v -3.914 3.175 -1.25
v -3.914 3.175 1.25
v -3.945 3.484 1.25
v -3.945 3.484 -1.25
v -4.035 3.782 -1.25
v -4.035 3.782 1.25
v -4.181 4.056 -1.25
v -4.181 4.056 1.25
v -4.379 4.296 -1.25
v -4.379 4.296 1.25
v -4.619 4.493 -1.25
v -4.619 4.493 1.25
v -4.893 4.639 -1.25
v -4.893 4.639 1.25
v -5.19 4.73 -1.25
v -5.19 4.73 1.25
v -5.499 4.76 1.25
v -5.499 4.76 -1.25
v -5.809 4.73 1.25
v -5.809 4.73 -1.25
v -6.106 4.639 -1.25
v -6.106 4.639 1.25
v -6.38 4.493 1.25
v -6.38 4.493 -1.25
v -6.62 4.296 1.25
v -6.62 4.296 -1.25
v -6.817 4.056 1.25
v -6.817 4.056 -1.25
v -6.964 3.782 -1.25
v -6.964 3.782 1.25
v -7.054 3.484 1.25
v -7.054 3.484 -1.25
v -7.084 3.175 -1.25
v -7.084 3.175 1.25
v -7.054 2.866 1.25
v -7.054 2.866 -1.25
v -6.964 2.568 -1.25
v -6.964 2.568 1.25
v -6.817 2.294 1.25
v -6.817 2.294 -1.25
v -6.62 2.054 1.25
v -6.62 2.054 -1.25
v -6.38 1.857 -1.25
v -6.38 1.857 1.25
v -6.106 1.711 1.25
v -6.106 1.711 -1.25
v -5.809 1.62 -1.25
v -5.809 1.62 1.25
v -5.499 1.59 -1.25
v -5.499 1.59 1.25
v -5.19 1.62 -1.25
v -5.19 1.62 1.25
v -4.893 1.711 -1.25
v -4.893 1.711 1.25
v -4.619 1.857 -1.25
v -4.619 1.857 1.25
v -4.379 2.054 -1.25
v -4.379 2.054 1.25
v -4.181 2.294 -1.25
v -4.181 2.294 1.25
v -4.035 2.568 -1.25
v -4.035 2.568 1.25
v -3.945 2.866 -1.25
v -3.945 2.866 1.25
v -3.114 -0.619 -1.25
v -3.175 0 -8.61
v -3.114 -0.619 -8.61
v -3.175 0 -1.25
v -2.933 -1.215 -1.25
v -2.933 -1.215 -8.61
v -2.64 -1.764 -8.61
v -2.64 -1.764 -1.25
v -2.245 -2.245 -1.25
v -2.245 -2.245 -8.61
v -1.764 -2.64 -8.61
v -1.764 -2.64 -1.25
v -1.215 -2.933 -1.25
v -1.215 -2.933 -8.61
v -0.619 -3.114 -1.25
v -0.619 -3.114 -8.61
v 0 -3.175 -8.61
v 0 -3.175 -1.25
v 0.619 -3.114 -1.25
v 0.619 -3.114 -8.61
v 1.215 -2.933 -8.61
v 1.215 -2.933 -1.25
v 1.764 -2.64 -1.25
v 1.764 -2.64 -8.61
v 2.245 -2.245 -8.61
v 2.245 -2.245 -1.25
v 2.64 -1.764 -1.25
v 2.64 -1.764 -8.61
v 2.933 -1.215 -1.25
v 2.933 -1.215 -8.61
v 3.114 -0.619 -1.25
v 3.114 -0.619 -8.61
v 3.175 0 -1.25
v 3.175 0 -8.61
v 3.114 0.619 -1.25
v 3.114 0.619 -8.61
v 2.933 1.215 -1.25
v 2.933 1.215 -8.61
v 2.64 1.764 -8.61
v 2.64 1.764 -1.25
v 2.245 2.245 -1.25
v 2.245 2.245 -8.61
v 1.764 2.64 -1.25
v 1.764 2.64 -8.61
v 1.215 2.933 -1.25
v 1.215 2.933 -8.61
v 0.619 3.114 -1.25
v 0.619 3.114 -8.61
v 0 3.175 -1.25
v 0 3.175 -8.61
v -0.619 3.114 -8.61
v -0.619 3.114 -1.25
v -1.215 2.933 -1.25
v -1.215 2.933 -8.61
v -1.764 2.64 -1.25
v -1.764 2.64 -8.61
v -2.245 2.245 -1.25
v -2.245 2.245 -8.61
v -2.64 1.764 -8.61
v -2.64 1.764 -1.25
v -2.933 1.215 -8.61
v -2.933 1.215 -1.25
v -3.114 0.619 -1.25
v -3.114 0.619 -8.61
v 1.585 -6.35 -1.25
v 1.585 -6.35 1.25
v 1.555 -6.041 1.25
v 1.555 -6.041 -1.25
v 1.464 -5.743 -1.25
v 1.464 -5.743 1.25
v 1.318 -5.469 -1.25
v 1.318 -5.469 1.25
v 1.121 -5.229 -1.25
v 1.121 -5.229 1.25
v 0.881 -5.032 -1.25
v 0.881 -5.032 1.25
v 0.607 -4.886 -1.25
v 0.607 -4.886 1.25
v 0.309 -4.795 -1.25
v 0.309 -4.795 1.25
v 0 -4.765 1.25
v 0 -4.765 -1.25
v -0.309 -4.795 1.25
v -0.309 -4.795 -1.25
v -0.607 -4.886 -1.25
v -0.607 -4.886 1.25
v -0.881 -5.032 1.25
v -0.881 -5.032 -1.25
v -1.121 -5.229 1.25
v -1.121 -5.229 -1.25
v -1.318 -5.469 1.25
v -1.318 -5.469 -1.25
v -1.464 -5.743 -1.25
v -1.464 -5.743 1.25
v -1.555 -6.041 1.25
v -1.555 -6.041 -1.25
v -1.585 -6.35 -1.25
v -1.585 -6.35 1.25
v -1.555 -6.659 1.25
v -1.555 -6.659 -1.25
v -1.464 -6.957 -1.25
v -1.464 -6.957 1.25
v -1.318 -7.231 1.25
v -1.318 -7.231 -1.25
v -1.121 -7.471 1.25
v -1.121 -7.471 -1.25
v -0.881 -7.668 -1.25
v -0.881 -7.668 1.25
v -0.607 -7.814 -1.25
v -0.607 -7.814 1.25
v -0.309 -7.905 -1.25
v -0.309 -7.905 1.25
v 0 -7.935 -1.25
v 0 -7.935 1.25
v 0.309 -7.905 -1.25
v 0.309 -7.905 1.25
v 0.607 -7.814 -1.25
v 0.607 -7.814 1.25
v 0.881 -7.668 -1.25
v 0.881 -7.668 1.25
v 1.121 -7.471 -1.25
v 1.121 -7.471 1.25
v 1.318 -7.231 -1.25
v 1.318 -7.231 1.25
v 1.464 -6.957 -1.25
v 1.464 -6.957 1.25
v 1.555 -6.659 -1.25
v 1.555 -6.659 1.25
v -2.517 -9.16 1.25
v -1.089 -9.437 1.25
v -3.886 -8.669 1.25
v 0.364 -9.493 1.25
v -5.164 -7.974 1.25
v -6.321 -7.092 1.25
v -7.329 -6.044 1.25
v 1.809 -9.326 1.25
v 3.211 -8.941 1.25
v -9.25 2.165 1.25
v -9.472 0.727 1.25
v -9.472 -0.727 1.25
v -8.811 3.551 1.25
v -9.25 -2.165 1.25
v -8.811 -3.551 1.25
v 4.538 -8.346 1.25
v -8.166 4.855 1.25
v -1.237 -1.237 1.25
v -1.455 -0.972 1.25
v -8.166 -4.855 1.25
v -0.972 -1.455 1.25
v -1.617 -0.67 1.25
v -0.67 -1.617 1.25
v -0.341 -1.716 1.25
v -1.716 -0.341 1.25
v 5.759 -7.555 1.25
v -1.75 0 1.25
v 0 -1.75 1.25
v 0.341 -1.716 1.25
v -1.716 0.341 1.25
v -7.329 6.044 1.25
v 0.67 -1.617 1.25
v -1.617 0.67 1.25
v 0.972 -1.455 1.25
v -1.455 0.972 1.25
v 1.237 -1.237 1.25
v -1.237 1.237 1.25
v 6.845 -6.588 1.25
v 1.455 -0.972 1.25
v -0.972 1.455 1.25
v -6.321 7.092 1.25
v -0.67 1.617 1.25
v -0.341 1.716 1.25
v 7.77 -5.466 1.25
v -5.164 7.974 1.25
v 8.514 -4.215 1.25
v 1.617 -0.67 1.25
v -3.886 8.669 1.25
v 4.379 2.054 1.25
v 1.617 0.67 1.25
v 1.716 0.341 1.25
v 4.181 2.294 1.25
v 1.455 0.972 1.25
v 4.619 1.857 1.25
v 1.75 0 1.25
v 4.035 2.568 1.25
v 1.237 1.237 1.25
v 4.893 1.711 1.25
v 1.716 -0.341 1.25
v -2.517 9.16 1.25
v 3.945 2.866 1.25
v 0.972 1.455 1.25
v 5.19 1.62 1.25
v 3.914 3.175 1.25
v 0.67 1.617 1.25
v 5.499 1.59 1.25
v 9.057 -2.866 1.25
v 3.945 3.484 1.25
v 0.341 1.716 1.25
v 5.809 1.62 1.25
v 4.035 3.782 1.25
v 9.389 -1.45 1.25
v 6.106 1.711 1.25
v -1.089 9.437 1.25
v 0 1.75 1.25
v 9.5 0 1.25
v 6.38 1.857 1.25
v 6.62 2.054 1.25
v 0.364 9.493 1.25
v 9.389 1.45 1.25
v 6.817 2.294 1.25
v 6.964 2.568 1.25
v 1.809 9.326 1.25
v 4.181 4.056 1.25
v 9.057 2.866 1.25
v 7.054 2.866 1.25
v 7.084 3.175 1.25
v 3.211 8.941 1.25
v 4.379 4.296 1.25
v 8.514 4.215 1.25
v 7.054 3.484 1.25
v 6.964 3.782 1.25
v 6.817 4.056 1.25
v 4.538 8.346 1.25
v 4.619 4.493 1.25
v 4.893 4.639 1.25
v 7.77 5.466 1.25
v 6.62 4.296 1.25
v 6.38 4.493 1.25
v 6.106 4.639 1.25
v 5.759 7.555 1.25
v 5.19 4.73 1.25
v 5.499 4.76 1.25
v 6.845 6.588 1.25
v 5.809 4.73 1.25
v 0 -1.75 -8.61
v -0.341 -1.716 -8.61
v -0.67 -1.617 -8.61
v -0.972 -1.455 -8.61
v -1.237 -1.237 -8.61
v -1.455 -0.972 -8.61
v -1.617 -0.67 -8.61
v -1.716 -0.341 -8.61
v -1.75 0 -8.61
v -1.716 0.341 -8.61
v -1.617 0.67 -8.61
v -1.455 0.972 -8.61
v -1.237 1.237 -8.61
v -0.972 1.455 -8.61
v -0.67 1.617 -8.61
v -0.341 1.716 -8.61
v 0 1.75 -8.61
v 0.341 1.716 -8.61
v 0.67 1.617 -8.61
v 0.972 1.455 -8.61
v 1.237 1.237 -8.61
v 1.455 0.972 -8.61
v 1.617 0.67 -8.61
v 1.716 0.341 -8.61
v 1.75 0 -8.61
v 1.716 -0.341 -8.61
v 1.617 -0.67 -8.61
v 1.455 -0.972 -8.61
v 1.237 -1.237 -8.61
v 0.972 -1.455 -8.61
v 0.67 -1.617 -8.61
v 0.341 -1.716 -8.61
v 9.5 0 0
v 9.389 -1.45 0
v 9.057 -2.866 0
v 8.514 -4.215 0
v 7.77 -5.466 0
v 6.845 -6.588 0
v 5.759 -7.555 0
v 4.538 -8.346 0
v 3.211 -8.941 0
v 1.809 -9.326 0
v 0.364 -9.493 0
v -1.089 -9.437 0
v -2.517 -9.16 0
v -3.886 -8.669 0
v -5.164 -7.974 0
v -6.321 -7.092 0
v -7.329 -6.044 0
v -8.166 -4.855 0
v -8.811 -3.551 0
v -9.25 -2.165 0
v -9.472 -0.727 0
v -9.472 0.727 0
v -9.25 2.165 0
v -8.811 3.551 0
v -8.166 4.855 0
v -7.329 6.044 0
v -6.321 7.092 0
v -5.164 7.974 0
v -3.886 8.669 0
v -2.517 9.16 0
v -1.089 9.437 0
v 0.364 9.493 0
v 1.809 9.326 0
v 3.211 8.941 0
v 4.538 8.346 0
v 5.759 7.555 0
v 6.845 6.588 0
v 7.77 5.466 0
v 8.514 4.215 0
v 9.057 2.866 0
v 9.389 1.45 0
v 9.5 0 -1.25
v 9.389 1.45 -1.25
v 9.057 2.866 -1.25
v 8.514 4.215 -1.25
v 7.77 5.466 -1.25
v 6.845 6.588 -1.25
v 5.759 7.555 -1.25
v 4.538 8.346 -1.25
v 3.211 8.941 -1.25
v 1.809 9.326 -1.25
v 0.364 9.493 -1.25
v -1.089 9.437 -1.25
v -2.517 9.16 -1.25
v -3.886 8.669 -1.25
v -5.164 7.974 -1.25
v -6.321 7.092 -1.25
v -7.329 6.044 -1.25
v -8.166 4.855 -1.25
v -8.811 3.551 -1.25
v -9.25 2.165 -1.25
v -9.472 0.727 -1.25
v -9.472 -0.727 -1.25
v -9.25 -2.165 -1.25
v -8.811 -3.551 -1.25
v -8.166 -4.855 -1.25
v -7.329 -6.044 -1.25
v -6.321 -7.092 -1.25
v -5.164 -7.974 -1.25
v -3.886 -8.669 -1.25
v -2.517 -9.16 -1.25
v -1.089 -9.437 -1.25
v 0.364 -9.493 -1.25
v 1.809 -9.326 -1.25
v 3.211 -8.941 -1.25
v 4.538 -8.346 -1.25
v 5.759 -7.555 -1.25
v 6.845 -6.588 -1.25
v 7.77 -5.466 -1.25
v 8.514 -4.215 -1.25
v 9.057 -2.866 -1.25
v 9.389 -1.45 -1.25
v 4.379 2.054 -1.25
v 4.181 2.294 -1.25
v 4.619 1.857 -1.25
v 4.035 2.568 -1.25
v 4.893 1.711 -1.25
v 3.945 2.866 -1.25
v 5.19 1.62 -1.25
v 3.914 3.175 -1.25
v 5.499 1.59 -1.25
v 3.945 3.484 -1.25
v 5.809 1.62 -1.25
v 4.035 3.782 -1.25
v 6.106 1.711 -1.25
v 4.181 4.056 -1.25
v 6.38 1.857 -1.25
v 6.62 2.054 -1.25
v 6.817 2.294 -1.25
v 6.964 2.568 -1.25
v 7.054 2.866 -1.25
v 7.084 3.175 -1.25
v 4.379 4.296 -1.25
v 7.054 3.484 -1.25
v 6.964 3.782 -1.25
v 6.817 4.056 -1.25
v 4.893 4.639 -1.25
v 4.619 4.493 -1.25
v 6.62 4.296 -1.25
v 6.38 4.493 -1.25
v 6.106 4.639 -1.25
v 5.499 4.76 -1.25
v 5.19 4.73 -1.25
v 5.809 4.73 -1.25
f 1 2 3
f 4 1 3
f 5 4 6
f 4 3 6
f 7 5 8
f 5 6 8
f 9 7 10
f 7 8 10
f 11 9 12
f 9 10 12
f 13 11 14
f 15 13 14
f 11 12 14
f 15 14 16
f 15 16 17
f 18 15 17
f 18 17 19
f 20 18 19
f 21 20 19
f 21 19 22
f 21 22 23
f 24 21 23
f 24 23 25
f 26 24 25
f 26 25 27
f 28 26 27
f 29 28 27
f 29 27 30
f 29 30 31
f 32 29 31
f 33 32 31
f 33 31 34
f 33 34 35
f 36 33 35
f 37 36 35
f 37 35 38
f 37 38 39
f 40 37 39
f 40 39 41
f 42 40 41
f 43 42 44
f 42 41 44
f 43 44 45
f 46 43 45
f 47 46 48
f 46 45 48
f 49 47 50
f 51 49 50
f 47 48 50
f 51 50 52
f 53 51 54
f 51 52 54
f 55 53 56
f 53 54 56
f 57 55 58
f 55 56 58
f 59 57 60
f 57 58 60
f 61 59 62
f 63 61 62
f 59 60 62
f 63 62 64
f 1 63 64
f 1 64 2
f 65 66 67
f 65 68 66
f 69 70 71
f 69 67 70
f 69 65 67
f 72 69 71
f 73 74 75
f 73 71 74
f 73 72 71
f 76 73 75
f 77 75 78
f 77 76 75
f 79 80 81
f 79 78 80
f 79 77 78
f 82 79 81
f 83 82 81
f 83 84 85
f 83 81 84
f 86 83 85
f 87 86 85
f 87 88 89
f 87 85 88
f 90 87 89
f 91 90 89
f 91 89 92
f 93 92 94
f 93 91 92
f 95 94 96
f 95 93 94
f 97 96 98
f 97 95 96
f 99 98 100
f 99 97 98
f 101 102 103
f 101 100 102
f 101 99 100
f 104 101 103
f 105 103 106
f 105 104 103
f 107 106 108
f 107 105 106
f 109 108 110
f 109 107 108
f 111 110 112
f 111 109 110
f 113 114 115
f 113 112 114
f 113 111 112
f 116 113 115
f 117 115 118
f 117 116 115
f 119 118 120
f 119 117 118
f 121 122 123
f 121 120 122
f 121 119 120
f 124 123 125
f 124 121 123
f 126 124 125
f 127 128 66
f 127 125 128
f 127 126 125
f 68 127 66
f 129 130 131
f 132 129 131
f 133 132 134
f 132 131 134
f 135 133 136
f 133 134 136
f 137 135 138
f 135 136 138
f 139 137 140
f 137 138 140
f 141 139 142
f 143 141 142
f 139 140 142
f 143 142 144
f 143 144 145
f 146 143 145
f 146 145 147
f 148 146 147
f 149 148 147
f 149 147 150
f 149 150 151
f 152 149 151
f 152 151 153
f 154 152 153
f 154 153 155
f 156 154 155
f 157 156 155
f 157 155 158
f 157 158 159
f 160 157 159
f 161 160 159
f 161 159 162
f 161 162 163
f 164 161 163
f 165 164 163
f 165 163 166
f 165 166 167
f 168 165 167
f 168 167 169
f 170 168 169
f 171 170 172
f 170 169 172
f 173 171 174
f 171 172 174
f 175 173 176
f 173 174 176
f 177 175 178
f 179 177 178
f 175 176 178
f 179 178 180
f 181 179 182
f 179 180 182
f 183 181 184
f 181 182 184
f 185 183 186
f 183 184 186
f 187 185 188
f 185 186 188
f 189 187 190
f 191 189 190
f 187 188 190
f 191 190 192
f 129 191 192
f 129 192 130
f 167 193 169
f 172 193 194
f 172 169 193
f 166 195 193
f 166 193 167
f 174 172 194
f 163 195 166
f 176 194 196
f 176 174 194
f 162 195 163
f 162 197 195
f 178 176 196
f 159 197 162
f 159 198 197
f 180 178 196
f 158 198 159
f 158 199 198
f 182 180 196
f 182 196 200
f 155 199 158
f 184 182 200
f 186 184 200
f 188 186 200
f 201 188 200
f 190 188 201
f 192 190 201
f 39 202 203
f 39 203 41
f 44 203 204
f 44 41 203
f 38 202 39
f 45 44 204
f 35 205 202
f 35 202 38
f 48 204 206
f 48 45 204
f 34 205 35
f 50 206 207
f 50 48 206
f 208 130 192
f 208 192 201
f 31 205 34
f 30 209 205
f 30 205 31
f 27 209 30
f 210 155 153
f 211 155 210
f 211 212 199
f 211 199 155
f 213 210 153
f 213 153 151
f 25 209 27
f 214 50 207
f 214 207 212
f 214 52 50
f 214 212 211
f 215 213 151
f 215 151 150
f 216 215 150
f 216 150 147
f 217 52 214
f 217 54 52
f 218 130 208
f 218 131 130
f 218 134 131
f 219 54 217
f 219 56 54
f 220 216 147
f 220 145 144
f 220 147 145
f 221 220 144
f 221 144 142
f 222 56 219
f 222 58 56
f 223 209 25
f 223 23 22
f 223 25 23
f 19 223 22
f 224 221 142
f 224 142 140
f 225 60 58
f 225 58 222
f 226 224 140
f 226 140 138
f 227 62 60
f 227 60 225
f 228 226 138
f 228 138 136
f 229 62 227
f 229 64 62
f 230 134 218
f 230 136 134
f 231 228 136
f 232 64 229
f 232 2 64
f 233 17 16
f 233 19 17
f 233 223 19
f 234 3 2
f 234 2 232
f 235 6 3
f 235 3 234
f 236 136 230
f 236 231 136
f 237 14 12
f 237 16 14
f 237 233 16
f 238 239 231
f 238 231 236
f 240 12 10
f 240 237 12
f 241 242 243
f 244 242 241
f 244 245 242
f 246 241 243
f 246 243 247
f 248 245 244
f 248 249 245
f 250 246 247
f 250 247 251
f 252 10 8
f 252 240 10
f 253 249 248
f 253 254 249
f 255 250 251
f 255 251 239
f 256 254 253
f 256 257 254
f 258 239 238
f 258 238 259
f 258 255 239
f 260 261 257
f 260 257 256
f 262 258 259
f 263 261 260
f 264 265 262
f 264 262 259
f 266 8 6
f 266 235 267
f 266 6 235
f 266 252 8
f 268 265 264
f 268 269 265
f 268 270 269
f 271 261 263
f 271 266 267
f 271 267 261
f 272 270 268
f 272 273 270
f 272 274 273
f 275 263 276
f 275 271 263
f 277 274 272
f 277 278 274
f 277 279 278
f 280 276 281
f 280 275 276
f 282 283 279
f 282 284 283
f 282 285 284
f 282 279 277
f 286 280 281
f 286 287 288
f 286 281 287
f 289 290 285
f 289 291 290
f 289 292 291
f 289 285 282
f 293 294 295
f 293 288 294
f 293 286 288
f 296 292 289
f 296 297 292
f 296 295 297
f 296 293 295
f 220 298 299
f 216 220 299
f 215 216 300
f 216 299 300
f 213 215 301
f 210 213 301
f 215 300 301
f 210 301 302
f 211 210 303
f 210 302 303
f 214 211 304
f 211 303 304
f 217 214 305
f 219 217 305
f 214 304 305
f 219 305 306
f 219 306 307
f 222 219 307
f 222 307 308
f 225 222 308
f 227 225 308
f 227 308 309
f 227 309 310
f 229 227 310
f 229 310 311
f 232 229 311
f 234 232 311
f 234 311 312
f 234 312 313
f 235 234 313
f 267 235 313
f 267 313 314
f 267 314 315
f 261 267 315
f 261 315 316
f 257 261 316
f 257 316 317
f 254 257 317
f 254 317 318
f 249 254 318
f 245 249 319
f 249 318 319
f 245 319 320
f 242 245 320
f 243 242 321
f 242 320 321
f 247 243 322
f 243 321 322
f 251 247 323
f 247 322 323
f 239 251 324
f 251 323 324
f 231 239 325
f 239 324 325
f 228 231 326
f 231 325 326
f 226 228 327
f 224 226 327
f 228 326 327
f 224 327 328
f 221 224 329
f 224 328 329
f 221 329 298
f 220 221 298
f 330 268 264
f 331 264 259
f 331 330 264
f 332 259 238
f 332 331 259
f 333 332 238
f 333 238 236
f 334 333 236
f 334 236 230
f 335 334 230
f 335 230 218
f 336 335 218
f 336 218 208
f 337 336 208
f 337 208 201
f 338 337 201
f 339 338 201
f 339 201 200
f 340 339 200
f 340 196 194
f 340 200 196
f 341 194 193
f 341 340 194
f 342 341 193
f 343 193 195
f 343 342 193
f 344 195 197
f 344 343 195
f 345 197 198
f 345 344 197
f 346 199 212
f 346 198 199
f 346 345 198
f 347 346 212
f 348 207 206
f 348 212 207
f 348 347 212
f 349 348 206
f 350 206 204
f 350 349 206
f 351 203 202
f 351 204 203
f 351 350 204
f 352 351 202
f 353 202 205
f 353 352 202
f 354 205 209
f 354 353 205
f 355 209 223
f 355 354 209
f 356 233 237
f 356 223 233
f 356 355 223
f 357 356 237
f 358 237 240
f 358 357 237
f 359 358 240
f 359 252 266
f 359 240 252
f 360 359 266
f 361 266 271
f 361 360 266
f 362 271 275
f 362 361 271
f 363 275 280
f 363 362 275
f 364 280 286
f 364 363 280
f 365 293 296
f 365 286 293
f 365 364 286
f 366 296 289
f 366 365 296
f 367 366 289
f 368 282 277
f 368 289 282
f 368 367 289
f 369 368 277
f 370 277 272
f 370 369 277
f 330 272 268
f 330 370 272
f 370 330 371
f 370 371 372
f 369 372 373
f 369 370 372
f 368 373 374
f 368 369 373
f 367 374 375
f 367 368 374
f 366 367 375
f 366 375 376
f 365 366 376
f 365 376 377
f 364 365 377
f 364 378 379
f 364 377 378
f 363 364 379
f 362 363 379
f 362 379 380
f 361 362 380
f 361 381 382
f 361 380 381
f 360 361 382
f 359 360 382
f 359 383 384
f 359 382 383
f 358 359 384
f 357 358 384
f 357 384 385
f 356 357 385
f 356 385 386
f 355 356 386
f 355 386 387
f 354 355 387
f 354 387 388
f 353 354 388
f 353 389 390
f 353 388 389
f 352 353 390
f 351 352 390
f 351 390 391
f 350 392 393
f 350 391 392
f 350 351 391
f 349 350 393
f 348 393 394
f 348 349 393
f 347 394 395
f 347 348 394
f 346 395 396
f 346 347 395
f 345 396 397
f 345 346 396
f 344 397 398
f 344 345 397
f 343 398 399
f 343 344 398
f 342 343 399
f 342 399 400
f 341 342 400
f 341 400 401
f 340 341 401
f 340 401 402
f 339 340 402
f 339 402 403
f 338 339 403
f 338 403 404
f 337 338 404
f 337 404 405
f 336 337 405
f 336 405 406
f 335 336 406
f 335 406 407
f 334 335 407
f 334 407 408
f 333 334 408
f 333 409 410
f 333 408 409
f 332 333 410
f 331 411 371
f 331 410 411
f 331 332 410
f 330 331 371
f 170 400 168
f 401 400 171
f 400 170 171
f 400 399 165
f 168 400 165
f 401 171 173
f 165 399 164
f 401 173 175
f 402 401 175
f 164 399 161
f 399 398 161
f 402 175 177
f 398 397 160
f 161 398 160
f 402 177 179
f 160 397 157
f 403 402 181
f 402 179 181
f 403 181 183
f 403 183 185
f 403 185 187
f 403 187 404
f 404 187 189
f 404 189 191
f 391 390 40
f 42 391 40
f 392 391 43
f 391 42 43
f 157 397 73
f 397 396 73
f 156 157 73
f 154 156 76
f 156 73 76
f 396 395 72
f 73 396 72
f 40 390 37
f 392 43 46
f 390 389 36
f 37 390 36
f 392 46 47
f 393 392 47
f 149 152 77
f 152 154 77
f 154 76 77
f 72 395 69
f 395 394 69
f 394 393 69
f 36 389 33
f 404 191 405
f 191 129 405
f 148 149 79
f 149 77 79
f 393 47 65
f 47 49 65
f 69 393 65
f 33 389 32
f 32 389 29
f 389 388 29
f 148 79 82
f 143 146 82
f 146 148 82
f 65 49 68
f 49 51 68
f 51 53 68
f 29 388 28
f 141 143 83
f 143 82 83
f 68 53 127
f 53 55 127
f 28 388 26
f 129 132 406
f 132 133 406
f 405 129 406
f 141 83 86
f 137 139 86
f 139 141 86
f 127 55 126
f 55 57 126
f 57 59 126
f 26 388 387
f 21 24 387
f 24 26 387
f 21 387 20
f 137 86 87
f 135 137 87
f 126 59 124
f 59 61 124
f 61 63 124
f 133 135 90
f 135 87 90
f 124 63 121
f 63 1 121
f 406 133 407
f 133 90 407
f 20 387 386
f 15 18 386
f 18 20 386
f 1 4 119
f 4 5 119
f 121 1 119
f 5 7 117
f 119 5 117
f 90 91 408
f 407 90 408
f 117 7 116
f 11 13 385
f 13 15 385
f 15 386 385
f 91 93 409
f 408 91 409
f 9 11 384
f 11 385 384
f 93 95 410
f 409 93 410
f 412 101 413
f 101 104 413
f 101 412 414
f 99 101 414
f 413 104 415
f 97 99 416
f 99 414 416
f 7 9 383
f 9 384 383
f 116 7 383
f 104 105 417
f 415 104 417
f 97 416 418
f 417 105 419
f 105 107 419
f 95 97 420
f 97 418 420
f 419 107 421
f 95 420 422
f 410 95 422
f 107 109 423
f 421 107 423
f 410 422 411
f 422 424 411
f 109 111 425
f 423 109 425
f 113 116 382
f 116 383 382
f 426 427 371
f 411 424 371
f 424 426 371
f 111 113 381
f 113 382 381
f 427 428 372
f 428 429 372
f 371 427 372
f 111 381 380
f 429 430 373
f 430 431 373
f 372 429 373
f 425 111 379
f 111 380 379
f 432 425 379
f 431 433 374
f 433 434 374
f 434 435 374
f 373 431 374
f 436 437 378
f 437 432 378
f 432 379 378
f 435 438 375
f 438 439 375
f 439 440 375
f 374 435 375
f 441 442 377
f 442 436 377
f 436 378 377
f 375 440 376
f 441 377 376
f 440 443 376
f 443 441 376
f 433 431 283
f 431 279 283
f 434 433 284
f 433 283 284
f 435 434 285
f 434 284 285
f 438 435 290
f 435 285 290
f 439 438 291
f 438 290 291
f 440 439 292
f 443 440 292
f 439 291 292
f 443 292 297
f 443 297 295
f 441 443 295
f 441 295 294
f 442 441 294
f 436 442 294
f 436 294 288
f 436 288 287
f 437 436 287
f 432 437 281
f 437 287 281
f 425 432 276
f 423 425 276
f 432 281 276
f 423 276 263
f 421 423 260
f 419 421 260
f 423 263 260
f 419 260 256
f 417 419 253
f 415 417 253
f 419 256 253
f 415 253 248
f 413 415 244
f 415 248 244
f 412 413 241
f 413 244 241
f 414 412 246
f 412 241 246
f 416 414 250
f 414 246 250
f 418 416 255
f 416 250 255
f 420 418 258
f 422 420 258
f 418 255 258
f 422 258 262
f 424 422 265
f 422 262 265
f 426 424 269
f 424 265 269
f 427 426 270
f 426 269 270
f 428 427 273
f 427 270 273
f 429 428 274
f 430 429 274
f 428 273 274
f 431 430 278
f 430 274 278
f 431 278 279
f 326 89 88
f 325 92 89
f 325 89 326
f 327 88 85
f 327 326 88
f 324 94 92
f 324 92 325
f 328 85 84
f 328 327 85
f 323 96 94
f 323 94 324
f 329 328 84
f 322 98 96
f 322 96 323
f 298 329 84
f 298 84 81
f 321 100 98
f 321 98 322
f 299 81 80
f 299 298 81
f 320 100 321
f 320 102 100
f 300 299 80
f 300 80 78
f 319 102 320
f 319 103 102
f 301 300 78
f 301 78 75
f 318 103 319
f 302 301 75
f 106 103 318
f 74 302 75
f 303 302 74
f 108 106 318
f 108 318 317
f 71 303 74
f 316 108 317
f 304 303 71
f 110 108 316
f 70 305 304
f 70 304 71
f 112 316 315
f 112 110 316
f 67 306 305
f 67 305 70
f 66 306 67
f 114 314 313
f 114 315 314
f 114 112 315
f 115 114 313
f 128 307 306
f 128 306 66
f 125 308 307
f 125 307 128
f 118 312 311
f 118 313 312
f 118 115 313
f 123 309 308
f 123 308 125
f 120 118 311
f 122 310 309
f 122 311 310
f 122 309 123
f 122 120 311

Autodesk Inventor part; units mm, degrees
ref_plane "YZ Plane" through (0, 0, 0) normal (1, 0, 0) x (0, 1, 0)
ref_plane "XZ Plane" through (0, 0, 0) normal (0, 1, 0) x (-1, 0, 0)
ref_plane "XY Plane" through (0, 0, 0) normal (0, 0, 1) x (1, 0, 0)
sketch "Sketch1" plane through (0, 0, 0) normal (0, 0, 1) x (1, 0, 0)
  line L0 (-13.3, 0) -> (13.3, 0) projected
  line L1 (0, -13.3) -> (0, 13.3) projected
  circle A0 centre (0, 0) radius 9.5
  circle A1 centre (0, 0) radius 1.3
  circle A2 centre (0, 0) radius 3.17
  dimension "d0" = 19
  dimension "d1" = 2.6
  dimension "d2" = 6.34
extrude "Extrusion4" add sketch "Sketch1" along normal mid plane 2.5 contours A1 L1 A2 L0 | L0 A2 L1 A1 | A2 L1 A0 L0 | L0 A0 L1 A2 | A1 L0 A2 L1 | L1 A2 L0 A1 | A2 L0 A0 L1 | L1 A0 L0 A2
sketch "Sketch3" plane through (0, 0, -1.25) normal (0, 0, -1) x (-1, 0, 0)
  circle A0 centre (0, 0) radius 3.175
  circle A1 centre (0, 0) radius 1.3021
  dimension "d21" = 6.35
extrude "Extrusion5" add sketch "Sketch3" along normal blind 7.36
sketch "Sketch4" plane through (0, 0, 1.25) normal (0, 0, 1) x (1, 0, 0)
  circle A0 centre (0, 0) radius 9.5 projected
  line L0 (-5.6994, 7.6005) -> (5.6994, 7.6005)
  arc A1 (5.6994, 7.6005) -> (-5.6994, 7.6005) centre (0, 0) ccw
  dimension "d27" = 11.3988
sketch "Sketch5" plane through (0, 0, 1.25) normal (0, 0, 1) x (1, 0, 0)
  point P0 (0, 0)
  point P1 (0, 0)
hole "Hole1" at (0, 0, 1.25) direction (0, 0, -1) diameter 3.5 end through all
sketch "Sketch6" plane through (0, 0, 1.25) normal (0, 0, 1) x (1, 0, 0)
  circle A0 centre (0, 0) radius 6.35 construction
  circle A1 centre (0, -6.35) radius 1.585
  line L0 (0, -13.3) -> (0, 13.3) construction
  line L1 (-13.3, 0) -> (13.3, 0) construction
  circle A2 centre (5.4993, 3.175) radius 1.585
  circle A3 centre (-5.4993, 3.175) radius 1.585
  dimension "d40" = 12.7
  dimension "d41" = 3.17
  dimension "d44" = 360
extrude "Extrusion7" cut sketch "Sketch6" against normal through all
sketch "Sketch7" plane through (0, 0, 1.25) normal (0, 0, 1) x (1, 0, 0)
  circle A0 centre (0, 0) radius 9.5 projected
properties part number "nakretka_na_igle"
